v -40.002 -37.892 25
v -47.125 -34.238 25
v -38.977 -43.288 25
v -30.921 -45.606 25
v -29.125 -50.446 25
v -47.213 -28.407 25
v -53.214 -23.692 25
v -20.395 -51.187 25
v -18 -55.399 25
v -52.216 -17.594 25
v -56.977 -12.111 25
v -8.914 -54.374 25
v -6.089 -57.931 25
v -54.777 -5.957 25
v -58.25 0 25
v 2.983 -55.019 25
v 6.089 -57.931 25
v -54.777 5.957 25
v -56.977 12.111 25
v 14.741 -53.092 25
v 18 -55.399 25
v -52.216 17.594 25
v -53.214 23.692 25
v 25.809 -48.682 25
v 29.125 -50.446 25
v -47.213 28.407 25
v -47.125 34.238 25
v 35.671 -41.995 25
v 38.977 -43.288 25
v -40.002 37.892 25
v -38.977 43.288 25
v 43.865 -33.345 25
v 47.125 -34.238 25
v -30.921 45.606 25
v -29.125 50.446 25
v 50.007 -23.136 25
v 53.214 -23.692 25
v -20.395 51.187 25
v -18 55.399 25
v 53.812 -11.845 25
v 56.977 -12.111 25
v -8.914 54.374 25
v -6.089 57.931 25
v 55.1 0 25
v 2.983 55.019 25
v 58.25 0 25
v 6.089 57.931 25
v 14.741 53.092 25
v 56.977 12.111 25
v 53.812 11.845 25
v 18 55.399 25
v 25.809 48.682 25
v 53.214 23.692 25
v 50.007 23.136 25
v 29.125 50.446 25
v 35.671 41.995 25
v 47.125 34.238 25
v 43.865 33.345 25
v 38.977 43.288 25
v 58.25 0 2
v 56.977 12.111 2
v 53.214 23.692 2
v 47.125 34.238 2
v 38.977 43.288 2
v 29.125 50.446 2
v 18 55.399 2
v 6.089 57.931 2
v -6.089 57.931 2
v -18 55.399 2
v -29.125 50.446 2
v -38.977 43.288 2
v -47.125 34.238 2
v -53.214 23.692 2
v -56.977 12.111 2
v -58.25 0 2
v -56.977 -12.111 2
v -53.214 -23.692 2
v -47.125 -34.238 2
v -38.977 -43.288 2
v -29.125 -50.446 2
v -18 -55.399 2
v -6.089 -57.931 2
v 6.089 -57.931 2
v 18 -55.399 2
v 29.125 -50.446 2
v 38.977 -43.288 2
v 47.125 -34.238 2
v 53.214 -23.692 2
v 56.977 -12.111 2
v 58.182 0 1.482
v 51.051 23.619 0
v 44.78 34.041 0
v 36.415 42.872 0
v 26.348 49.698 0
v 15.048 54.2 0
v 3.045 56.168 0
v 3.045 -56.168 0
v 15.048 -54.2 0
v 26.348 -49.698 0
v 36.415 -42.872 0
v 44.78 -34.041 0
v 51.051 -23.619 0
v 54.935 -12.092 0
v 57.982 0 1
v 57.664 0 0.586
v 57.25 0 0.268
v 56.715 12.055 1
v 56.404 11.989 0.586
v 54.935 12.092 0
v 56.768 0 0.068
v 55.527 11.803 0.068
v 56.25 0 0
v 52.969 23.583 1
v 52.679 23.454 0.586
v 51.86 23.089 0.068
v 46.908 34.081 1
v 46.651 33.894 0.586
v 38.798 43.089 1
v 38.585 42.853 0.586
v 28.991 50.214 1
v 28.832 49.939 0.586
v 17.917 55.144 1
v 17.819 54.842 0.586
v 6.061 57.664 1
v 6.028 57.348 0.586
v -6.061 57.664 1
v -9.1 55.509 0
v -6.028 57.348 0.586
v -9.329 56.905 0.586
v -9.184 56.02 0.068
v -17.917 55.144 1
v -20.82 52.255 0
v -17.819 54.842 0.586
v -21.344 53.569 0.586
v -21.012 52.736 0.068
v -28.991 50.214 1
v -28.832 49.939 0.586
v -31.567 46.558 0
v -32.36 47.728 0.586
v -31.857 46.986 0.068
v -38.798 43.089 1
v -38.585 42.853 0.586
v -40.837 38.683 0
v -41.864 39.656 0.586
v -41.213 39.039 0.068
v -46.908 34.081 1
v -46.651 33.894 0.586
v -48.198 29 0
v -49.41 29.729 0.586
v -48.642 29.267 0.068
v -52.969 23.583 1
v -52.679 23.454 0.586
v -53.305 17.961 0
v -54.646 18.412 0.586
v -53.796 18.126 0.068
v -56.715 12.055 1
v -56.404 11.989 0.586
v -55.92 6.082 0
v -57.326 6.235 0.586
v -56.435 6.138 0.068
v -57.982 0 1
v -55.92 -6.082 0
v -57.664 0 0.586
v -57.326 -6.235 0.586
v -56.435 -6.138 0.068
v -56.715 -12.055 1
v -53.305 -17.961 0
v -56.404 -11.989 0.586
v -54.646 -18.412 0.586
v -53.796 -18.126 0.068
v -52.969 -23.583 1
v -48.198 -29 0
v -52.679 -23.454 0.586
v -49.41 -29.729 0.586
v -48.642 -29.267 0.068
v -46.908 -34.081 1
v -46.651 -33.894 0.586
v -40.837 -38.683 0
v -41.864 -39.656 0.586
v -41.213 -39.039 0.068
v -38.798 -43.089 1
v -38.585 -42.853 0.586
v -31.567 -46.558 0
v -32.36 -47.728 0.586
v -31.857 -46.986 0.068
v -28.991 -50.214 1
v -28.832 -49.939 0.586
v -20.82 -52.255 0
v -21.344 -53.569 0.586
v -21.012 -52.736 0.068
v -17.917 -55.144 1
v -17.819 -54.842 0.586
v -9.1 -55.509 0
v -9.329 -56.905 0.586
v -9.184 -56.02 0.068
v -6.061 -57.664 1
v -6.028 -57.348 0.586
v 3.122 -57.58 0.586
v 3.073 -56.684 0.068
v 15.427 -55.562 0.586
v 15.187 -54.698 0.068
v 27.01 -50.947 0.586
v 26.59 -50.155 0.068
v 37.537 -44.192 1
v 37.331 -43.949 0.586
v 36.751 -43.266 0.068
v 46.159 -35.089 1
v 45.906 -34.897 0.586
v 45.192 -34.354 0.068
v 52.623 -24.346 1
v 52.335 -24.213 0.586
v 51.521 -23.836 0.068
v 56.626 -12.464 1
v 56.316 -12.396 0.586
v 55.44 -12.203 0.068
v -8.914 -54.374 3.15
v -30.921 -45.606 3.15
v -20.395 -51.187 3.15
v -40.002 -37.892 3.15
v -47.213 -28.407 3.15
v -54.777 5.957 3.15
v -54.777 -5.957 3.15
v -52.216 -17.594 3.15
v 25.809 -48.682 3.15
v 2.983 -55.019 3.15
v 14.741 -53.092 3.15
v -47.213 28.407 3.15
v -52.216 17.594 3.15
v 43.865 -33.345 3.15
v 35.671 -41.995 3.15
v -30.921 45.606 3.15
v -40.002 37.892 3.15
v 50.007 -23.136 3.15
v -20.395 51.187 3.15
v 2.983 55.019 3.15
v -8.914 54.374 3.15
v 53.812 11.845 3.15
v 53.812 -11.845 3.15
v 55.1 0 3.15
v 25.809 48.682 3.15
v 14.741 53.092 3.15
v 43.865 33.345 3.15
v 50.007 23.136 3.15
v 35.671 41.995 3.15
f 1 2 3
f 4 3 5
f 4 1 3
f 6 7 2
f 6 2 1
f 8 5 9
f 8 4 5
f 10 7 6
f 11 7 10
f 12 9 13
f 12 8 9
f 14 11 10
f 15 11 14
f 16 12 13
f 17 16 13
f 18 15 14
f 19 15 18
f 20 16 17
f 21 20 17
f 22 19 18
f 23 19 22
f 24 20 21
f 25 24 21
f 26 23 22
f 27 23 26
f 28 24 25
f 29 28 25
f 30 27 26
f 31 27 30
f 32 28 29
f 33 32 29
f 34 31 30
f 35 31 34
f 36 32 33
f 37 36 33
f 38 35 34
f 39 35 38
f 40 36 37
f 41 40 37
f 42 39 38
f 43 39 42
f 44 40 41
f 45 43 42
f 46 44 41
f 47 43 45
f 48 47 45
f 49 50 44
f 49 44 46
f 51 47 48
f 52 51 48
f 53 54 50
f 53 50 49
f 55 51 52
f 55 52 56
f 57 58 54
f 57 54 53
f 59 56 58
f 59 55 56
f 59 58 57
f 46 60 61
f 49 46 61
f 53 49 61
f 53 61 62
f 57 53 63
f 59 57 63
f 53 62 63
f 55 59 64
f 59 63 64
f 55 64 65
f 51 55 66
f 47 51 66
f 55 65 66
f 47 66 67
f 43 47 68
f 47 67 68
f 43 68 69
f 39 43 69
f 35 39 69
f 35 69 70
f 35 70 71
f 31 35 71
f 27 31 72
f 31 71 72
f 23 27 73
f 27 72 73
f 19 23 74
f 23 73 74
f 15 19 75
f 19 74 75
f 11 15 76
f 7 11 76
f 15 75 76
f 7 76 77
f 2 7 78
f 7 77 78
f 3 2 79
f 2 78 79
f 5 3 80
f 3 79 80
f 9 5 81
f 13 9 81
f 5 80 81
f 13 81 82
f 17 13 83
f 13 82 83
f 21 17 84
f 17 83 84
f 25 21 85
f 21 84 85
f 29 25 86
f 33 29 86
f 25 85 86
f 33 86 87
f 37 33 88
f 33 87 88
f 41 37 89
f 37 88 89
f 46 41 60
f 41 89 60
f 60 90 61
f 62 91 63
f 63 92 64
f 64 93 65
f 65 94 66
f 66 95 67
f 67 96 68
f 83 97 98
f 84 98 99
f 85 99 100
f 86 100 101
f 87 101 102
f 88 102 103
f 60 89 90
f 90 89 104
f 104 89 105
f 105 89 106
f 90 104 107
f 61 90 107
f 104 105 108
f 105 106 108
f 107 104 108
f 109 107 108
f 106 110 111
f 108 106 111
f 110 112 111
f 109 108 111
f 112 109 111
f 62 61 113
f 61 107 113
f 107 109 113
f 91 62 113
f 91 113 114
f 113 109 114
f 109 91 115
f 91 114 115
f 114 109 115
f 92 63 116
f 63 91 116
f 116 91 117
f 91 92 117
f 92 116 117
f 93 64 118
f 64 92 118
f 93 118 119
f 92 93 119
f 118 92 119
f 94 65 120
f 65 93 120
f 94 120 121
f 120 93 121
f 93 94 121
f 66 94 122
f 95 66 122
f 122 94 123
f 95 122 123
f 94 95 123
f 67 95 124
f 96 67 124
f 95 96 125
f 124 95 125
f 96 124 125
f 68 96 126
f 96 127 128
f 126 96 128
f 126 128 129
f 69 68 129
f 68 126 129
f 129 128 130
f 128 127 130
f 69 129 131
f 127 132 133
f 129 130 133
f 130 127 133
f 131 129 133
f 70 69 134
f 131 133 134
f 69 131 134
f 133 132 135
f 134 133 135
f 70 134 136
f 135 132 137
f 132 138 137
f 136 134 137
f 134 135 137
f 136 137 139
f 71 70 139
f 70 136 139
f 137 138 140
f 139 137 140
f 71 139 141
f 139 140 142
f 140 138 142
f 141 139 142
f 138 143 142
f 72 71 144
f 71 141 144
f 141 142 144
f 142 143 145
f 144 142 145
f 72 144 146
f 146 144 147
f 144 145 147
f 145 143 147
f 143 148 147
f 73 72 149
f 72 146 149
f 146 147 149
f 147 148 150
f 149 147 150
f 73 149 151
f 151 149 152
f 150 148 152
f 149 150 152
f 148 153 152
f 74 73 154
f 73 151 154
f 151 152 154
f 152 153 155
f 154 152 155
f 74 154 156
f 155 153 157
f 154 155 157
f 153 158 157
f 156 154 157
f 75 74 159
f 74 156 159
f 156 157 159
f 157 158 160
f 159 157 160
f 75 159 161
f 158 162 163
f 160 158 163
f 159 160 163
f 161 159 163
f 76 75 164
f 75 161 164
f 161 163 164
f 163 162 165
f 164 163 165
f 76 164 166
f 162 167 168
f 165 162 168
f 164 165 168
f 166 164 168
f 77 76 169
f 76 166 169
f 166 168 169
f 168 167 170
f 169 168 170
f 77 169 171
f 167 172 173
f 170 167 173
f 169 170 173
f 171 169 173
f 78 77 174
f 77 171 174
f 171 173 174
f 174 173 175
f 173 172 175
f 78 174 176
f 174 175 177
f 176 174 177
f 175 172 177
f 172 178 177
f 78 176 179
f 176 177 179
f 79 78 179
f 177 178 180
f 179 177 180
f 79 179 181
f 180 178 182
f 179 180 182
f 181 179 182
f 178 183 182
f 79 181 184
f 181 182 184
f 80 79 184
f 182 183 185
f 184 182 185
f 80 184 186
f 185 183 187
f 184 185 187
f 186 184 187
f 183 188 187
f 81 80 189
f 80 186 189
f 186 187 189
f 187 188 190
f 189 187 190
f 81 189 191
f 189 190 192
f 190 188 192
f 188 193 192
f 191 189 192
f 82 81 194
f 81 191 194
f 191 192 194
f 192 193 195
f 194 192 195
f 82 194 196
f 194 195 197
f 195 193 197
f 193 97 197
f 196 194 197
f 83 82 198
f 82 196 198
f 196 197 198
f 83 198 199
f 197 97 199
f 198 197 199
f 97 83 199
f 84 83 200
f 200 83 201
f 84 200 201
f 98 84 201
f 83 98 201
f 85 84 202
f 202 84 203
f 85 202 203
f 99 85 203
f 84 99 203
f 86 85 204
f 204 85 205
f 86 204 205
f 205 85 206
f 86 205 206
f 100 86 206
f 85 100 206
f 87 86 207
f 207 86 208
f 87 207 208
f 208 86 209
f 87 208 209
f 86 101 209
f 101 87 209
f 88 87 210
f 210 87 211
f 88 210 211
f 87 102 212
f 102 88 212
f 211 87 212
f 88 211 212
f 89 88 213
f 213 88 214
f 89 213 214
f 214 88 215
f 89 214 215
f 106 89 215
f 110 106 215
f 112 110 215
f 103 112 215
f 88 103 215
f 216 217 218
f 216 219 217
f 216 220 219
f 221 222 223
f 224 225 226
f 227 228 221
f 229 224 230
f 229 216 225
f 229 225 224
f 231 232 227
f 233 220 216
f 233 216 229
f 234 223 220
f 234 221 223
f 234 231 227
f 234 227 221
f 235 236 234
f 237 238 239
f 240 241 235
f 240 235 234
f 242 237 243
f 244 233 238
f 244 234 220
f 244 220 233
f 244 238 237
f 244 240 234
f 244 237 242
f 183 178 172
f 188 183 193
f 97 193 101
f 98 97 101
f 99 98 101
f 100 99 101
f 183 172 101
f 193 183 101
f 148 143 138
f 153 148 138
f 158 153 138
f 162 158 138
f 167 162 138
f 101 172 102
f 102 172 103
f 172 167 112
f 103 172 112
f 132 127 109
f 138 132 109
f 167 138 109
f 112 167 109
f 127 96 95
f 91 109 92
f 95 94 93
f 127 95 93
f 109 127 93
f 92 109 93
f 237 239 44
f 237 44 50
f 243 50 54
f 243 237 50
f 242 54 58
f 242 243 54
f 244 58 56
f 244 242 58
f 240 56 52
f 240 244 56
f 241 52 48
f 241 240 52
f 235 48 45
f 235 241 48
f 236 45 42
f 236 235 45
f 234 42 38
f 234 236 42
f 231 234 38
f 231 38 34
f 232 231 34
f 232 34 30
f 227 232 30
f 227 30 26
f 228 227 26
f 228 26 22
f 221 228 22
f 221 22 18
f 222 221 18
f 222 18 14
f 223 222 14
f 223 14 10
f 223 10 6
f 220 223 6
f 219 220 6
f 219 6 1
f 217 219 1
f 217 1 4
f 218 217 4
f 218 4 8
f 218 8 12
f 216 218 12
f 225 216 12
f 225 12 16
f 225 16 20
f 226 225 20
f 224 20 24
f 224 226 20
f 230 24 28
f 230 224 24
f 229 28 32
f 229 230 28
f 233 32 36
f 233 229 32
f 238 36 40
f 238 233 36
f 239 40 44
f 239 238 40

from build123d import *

# Parameters (mm, degrees)
F0_R     = 58.25
F1_DEPTH = 25
F2_T     = -3.15
F3_R     = 2


with BuildPart() as f1:
    # F0 (on Top) → F1 (new body)
    with BuildSketch(Plane.XY):
        Circle(F0_R)
    extrude(amount=F1_DEPTH)

    # F2
    f2_openings = [f1.faces().sort_by_distance(p)[0] for p in [
        (0, 0, 25),
    ]]
    offset(amount=F2_T, openings=f2_openings)

    # F3
    f3_edges = [f1.edges().sort_by_distance(p)[0] for p in [
        (-58.25, 0, 0),
    ]]
    fillet(f3_edges, radius=F3_R)


solid = f1.part
